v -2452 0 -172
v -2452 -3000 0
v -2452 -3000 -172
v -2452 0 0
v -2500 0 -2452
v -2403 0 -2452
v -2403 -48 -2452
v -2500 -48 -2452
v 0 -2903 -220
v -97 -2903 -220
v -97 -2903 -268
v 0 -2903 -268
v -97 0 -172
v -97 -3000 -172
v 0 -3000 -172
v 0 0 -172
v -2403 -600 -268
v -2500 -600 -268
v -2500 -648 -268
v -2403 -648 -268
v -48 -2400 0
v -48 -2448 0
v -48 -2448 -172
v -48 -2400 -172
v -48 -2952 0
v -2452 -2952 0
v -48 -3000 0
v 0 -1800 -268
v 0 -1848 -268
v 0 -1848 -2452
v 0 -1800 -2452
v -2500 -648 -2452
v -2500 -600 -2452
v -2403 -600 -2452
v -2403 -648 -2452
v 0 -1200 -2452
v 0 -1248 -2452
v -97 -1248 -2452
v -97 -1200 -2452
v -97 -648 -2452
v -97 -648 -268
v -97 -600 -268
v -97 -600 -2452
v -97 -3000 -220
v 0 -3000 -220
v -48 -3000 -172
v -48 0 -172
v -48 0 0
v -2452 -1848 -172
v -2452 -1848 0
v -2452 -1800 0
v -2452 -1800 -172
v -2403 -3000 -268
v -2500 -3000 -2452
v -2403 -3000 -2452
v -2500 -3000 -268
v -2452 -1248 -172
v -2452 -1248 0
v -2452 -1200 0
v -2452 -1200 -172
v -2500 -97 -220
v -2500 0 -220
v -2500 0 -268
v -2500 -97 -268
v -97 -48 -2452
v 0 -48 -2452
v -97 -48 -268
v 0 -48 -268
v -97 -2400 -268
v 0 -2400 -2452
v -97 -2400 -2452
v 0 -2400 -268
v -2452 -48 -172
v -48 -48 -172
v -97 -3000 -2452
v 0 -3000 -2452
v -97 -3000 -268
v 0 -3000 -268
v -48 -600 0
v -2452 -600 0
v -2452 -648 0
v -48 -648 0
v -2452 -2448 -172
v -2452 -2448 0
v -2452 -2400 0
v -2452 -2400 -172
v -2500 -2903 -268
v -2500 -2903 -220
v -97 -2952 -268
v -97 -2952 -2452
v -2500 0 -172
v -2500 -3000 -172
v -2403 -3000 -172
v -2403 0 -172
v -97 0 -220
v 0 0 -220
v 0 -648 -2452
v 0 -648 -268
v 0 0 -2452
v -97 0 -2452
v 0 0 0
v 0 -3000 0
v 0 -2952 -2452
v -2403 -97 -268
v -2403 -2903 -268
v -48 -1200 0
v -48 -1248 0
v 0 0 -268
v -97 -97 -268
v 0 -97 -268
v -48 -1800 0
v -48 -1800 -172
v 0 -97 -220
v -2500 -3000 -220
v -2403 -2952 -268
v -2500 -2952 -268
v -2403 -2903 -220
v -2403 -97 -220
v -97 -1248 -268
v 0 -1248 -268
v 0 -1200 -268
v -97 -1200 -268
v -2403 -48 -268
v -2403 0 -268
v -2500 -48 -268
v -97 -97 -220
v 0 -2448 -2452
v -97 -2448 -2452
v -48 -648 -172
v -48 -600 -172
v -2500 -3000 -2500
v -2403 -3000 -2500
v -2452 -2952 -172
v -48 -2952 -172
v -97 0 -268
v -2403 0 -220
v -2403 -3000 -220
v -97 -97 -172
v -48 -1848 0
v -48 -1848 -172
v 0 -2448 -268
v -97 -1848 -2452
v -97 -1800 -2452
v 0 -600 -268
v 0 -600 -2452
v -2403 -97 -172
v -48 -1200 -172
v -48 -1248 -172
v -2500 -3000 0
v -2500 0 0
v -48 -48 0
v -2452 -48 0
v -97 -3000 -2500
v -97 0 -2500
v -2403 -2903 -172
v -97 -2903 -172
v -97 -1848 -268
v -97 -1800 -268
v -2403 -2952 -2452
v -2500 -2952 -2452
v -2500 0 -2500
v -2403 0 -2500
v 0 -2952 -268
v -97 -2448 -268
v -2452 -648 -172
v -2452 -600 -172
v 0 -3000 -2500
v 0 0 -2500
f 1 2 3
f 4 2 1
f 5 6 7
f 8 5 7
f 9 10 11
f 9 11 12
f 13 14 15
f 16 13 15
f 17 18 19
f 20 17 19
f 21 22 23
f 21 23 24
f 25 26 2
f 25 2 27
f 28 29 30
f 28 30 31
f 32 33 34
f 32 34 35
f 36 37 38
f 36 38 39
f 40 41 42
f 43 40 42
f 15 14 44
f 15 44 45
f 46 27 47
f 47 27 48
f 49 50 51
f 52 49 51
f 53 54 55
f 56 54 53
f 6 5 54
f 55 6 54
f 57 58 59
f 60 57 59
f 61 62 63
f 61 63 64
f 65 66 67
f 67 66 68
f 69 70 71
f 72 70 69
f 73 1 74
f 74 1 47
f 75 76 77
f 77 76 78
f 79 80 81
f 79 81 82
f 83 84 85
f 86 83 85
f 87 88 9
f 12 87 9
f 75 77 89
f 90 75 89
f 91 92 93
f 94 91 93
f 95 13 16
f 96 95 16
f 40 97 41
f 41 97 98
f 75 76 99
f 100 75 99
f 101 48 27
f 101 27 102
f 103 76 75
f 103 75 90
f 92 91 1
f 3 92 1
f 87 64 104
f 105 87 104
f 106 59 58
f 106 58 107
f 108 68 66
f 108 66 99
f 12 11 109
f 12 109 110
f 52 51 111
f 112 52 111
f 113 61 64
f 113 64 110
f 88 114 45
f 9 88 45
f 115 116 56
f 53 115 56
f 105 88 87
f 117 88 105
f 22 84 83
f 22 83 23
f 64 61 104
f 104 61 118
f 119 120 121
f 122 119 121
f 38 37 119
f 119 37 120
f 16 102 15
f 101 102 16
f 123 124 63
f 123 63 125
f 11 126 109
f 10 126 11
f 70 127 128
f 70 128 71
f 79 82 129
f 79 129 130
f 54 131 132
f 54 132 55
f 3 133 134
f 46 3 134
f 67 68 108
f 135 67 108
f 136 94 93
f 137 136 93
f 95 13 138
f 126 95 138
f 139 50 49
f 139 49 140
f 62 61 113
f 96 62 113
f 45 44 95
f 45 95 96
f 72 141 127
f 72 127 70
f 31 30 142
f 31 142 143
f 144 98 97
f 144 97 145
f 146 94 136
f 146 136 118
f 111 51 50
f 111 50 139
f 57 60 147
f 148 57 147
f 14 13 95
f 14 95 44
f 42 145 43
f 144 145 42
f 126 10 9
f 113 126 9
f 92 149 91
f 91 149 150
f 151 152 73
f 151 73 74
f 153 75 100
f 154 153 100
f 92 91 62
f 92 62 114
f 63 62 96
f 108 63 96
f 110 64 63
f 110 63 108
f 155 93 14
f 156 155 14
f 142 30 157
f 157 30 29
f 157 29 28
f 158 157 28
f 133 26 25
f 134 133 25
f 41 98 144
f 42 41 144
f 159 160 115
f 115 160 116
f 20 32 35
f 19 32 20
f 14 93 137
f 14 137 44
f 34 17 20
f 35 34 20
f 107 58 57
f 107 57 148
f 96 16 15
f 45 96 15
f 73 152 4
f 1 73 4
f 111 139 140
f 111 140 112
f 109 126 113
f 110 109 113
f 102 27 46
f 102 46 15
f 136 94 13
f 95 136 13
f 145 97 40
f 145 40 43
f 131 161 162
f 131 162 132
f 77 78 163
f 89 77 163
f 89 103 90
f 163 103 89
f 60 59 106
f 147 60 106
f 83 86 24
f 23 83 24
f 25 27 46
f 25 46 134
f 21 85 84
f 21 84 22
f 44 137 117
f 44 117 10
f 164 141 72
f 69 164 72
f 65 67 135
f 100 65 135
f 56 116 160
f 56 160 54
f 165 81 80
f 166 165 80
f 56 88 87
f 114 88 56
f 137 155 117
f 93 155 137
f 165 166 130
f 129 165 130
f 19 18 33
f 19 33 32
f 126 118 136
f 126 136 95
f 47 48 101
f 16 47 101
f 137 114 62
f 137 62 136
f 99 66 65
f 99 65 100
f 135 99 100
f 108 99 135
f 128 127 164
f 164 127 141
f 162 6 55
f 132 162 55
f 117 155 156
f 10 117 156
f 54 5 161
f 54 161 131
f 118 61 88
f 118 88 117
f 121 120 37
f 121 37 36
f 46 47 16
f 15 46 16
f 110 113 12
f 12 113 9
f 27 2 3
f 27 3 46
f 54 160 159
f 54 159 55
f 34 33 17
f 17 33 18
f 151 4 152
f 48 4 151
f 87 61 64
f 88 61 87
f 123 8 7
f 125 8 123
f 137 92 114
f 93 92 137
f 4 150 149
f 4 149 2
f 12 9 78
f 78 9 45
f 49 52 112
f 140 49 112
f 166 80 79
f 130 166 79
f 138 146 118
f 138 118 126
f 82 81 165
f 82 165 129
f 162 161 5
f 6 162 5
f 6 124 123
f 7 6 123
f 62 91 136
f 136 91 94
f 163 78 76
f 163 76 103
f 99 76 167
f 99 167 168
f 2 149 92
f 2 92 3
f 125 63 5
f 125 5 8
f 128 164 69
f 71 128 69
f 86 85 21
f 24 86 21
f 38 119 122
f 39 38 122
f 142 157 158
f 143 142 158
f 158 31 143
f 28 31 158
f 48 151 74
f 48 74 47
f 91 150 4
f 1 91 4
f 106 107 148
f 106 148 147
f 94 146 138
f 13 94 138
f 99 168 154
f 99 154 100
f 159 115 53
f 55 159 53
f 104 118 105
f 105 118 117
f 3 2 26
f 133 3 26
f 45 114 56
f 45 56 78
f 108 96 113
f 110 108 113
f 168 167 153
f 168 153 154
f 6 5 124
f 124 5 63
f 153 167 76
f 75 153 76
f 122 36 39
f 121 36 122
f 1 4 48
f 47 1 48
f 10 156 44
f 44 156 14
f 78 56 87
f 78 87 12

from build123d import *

# Parameters (mm, degrees)
F3_W      = 48
F3_H      = 3000
F4_DEPTH  = 172
F5_W      = 2404
F5_H      = 48
F6_DEPTH  = 172
F7_W      = 97
F7_H      = 3000
F8_DEPTH  = 48
F9_W      = 2306
F9_H      = 97
F10_DEPTH = 48
F11_W     = 2500
F11_H     = 97
F12_DEPTH = 48
F13_W     = 97
F13_H     = 2806
F14_DEPTH = 48
F15_W     = 3000
F15_H     = 48
F16_DEPTH = 97
F17_W     = 48
F17_H     = 2184
F18_DEPTH = 97
F19_W     = 3000
F19_H     = 48
F20_DEPTH = 97
F21_W     = 48
F21_H     = 2184
F22_DEPTH = 97
F23_W     = 48
F23_H     = 2184
F24_DEPTH = 97


with BuildPart() as f4:
    # F3 (on Top) → F4 (new body)
    with BuildSketch(Plane.XY):
        with Locations((-24, -1500)):
            Rectangle(F3_W, F3_H)
    extrude(amount=-F4_DEPTH)


with BuildPart() as f4b:
    # F3 (on Top) → F4, piece 2 (new body)
    with BuildSketch(Plane.XY):
        with Locations((-2476, -1500)):
            Rectangle(F3_W, F3_H)
    extrude(amount=-F4_DEPTH)


with BuildPart() as f6:
    # F5 (on face) → F6 (new body)
    with BuildSketch(Plane.XY):
        with Locations((-1250, -24)):
            Rectangle(F5_W, F5_H)
    extrude(amount=-F6_DEPTH)


with BuildPart() as f6b:
    # F5 (on face) → F6, piece 2 (new body)
    with BuildSketch(Plane.XY):
        with Locations((-1250, -624)):
            Rectangle(F5_W, F5_H)
    extrude(amount=-F6_DEPTH)


with BuildPart() as f6c:
    # F5 (on face) → F6, piece 3 (new body)
    with BuildSketch(Plane.XY):
        with Locations((-1250, -1224)):
            Rectangle(F5_W, F5_H)
    extrude(amount=-F6_DEPTH)


with BuildPart() as f6d:
    # F5 (on face) → F6, piece 4 (new body)
    with BuildSketch(Plane.XY):
        with Locations((-1250, -1824)):
            Rectangle(F5_W, F5_H)
    extrude(amount=-F6_DEPTH)


with BuildPart() as f6e:
    # F5 (on face) → F6, piece 5 (new body)
    with BuildSketch(Plane.XY):
        with Locations((-1250, -2424)):
            Rectangle(F5_W, F5_H)
    extrude(amount=-F6_DEPTH)


with BuildPart() as f6f:
    # F5 (on face) → F6, piece 6 (new body)
    with BuildSketch(Plane.XY):
        with Locations((-1250, -2976)):
            Rectangle(F5_W, F5_H)
    extrude(amount=-F6_DEPTH)


with BuildPart() as f8:
    # F7 (on face) → F8 (new body)
    with BuildSketch(Plane(origin=(0, 0, -172), x_dir=(1, 0, 0), z_dir=(0, 0, -1))):
        with Locations((-48.5, 1500)):
            Rectangle(F7_W, F7_H)
    extrude(amount=F8_DEPTH)


with BuildPart() as f8b:
    # F7 (on face) → F8, piece 2 (new body)
    with BuildSketch(Plane(origin=(0, 0, -172), x_dir=(1, 0, 0), z_dir=(0, 0, -1))):
        with Locations((-2451.5, 1500)):
            Rectangle(F7_W, F7_H)
    extrude(amount=F8_DEPTH)


with BuildPart() as f10:
    # F9 (on face) → F10 (new body)
    with BuildSketch(Plane(origin=(0, 0, -172), x_dir=(1, 0, 0), z_dir=(0, 0, -1))):
        with Locations((-1250, 48.5)):
            Rectangle(F9_W, F9_H)
    extrude(amount=F10_DEPTH)


with BuildPart() as f10b:
    # F9 (on face) → F10, piece 2 (new body)
    with BuildSketch(Plane(origin=(0, 0, -172), x_dir=(1, 0, 0), z_dir=(0, 0, -1))):
        with Locations((-1250, 2951.5)):
            Rectangle(F9_W, F9_H)
    extrude(amount=F10_DEPTH)


with BuildPart() as f12:
    # F11 (on face) → F12 (new body)
    with BuildSketch(Plane(origin=(0, 0, -220), x_dir=(1, 0, 0), z_dir=(0, 0, -1))):
        with Locations((-1250, 48.5)):
            Rectangle(F11_W, F11_H)
    extrude(amount=F12_DEPTH)


with BuildPart() as f12b:
    # F11 (on face) → F12, piece 2 (new body)
    with BuildSketch(Plane(origin=(0, 0, -220), x_dir=(1, 0, 0), z_dir=(0, 0, -1))):
        with Locations((-1250, 2951.5)):
            Rectangle(F11_W, F11_H)
    extrude(amount=F12_DEPTH)


with BuildPart() as f14:
    # F13 (on face) → F14 (new body)
    with BuildSketch(Plane(origin=(0, 0, -220), x_dir=(1, 0, 0), z_dir=(0, 0, -1))):
        with Locations((-48.5, 1500)):
            Rectangle(F13_W, F13_H)
    extrude(amount=F14_DEPTH)


with BuildPart() as f14b:
    # F13 (on face) → F14, piece 2 (new body)
    with BuildSketch(Plane(origin=(0, 0, -220), x_dir=(1, 0, 0), z_dir=(0, 0, -1))):
        with Locations((-2451.5, 1500)):
            Rectangle(F13_W, F13_H)
    extrude(amount=F14_DEPTH)


with BuildPart() as f16:
    # F15 (on Right) → F16 (new body)
    with BuildSketch(Plane.YZ):
        with Locations((-1500, -2476)):
            Rectangle(F15_W, F15_H)
    extrude(amount=-F16_DEPTH)


with BuildPart() as f18:
    # F17 (on Right) → F18 (new body)
    with BuildSketch(Plane.YZ):
        with Locations((-24, -1360)):
            Rectangle(F17_W, F17_H)
    extrude(amount=-F18_DEPTH)


with BuildPart() as f18b:
    # F17 (on Right) → F18, piece 2 (new body)
    with BuildSketch(Plane.YZ):
        with Locations((-624, -1360)):
            Rectangle(F17_W, F17_H)
    extrude(amount=-F18_DEPTH)


with BuildPart() as f18c:
    # F17 (on Right) → F18, piece 3 (new body)
    with BuildSketch(Plane.YZ):
        with Locations((-1224, -1360)):
            Rectangle(F17_W, F17_H)
    extrude(amount=-F18_DEPTH)


with BuildPart() as f18d:
    # F17 (on Right) → F18, piece 4 (new body)
    with BuildSketch(Plane.YZ):
        with Locations((-1824, -1360)):
            Rectangle(F17_W, F17_H)
    extrude(amount=-F18_DEPTH)


with BuildPart() as f18e:
    # F17 (on Right) → F18, piece 5 (new body)
    with BuildSketch(Plane.YZ):
        with Locations((-2424, -1360)):
            Rectangle(F17_W, F17_H)
    extrude(amount=-F18_DEPTH)


with BuildPart() as f18f:
    # F17 (on Right) → F18, piece 6 (new body)
    with BuildSketch(Plane.YZ):
        with Locations((-2976, -1360)):
            Rectangle(F17_W, F17_H)
    extrude(amount=-F18_DEPTH)


with BuildPart() as f20:
    # F19 (on face) → F20 (new body)
    with BuildSketch(Plane(origin=(-2500, 0, 0), x_dir=(0, -1, 0), z_dir=(-1, 0, 0))):
        with Locations((1500, -2476)):
            Rectangle(F19_W, F19_H)
    extrude(amount=-F20_DEPTH)


with BuildPart() as f22:
    # F21 (on face) → F22 (new body)
    with BuildSketch(Plane(origin=(-2500, 0, 0), x_dir=(0, -1, 0), z_dir=(-1, 0, 0))):
        with Locations((24, -1360)):
            Rectangle(F21_W, F21_H)
    extrude(amount=-F22_DEPTH)


with BuildPart() as f22b:
    # F21 (on face) → F22, piece 2 (new body)
    with BuildSketch(Plane(origin=(-2500, 0, 0), x_dir=(0, -1, 0), z_dir=(-1, 0, 0))):
        with Locations((624, -1360)):
            Rectangle(F21_W, F21_H)
    extrude(amount=-F22_DEPTH)


with BuildPart() as f24:
    # F23 (on face) → F24 (new body)
    with BuildSketch(Plane(origin=(-2500, 0, 0), x_dir=(0, -1, 0), z_dir=(-1, 0, 0))):
        with Locations((2976, -1360)):
            Rectangle(F23_W, F23_H)
    extrude(amount=-F24_DEPTH)


solid = Compound([f4.part, f4b.part, f6.part, f6b.part, f6c.part, f6d.part, f6e.part, f6f.part, f8.part, f8b.part, f10.part, f10b.part, f12.part, f12b.part, f14.part, f14b.part, f16.part, f18.part, f18b.part, f18c.part, f18d.part, f18e.part, f18f.part, f20.part, f22.part, f22b.part, f24.part])
